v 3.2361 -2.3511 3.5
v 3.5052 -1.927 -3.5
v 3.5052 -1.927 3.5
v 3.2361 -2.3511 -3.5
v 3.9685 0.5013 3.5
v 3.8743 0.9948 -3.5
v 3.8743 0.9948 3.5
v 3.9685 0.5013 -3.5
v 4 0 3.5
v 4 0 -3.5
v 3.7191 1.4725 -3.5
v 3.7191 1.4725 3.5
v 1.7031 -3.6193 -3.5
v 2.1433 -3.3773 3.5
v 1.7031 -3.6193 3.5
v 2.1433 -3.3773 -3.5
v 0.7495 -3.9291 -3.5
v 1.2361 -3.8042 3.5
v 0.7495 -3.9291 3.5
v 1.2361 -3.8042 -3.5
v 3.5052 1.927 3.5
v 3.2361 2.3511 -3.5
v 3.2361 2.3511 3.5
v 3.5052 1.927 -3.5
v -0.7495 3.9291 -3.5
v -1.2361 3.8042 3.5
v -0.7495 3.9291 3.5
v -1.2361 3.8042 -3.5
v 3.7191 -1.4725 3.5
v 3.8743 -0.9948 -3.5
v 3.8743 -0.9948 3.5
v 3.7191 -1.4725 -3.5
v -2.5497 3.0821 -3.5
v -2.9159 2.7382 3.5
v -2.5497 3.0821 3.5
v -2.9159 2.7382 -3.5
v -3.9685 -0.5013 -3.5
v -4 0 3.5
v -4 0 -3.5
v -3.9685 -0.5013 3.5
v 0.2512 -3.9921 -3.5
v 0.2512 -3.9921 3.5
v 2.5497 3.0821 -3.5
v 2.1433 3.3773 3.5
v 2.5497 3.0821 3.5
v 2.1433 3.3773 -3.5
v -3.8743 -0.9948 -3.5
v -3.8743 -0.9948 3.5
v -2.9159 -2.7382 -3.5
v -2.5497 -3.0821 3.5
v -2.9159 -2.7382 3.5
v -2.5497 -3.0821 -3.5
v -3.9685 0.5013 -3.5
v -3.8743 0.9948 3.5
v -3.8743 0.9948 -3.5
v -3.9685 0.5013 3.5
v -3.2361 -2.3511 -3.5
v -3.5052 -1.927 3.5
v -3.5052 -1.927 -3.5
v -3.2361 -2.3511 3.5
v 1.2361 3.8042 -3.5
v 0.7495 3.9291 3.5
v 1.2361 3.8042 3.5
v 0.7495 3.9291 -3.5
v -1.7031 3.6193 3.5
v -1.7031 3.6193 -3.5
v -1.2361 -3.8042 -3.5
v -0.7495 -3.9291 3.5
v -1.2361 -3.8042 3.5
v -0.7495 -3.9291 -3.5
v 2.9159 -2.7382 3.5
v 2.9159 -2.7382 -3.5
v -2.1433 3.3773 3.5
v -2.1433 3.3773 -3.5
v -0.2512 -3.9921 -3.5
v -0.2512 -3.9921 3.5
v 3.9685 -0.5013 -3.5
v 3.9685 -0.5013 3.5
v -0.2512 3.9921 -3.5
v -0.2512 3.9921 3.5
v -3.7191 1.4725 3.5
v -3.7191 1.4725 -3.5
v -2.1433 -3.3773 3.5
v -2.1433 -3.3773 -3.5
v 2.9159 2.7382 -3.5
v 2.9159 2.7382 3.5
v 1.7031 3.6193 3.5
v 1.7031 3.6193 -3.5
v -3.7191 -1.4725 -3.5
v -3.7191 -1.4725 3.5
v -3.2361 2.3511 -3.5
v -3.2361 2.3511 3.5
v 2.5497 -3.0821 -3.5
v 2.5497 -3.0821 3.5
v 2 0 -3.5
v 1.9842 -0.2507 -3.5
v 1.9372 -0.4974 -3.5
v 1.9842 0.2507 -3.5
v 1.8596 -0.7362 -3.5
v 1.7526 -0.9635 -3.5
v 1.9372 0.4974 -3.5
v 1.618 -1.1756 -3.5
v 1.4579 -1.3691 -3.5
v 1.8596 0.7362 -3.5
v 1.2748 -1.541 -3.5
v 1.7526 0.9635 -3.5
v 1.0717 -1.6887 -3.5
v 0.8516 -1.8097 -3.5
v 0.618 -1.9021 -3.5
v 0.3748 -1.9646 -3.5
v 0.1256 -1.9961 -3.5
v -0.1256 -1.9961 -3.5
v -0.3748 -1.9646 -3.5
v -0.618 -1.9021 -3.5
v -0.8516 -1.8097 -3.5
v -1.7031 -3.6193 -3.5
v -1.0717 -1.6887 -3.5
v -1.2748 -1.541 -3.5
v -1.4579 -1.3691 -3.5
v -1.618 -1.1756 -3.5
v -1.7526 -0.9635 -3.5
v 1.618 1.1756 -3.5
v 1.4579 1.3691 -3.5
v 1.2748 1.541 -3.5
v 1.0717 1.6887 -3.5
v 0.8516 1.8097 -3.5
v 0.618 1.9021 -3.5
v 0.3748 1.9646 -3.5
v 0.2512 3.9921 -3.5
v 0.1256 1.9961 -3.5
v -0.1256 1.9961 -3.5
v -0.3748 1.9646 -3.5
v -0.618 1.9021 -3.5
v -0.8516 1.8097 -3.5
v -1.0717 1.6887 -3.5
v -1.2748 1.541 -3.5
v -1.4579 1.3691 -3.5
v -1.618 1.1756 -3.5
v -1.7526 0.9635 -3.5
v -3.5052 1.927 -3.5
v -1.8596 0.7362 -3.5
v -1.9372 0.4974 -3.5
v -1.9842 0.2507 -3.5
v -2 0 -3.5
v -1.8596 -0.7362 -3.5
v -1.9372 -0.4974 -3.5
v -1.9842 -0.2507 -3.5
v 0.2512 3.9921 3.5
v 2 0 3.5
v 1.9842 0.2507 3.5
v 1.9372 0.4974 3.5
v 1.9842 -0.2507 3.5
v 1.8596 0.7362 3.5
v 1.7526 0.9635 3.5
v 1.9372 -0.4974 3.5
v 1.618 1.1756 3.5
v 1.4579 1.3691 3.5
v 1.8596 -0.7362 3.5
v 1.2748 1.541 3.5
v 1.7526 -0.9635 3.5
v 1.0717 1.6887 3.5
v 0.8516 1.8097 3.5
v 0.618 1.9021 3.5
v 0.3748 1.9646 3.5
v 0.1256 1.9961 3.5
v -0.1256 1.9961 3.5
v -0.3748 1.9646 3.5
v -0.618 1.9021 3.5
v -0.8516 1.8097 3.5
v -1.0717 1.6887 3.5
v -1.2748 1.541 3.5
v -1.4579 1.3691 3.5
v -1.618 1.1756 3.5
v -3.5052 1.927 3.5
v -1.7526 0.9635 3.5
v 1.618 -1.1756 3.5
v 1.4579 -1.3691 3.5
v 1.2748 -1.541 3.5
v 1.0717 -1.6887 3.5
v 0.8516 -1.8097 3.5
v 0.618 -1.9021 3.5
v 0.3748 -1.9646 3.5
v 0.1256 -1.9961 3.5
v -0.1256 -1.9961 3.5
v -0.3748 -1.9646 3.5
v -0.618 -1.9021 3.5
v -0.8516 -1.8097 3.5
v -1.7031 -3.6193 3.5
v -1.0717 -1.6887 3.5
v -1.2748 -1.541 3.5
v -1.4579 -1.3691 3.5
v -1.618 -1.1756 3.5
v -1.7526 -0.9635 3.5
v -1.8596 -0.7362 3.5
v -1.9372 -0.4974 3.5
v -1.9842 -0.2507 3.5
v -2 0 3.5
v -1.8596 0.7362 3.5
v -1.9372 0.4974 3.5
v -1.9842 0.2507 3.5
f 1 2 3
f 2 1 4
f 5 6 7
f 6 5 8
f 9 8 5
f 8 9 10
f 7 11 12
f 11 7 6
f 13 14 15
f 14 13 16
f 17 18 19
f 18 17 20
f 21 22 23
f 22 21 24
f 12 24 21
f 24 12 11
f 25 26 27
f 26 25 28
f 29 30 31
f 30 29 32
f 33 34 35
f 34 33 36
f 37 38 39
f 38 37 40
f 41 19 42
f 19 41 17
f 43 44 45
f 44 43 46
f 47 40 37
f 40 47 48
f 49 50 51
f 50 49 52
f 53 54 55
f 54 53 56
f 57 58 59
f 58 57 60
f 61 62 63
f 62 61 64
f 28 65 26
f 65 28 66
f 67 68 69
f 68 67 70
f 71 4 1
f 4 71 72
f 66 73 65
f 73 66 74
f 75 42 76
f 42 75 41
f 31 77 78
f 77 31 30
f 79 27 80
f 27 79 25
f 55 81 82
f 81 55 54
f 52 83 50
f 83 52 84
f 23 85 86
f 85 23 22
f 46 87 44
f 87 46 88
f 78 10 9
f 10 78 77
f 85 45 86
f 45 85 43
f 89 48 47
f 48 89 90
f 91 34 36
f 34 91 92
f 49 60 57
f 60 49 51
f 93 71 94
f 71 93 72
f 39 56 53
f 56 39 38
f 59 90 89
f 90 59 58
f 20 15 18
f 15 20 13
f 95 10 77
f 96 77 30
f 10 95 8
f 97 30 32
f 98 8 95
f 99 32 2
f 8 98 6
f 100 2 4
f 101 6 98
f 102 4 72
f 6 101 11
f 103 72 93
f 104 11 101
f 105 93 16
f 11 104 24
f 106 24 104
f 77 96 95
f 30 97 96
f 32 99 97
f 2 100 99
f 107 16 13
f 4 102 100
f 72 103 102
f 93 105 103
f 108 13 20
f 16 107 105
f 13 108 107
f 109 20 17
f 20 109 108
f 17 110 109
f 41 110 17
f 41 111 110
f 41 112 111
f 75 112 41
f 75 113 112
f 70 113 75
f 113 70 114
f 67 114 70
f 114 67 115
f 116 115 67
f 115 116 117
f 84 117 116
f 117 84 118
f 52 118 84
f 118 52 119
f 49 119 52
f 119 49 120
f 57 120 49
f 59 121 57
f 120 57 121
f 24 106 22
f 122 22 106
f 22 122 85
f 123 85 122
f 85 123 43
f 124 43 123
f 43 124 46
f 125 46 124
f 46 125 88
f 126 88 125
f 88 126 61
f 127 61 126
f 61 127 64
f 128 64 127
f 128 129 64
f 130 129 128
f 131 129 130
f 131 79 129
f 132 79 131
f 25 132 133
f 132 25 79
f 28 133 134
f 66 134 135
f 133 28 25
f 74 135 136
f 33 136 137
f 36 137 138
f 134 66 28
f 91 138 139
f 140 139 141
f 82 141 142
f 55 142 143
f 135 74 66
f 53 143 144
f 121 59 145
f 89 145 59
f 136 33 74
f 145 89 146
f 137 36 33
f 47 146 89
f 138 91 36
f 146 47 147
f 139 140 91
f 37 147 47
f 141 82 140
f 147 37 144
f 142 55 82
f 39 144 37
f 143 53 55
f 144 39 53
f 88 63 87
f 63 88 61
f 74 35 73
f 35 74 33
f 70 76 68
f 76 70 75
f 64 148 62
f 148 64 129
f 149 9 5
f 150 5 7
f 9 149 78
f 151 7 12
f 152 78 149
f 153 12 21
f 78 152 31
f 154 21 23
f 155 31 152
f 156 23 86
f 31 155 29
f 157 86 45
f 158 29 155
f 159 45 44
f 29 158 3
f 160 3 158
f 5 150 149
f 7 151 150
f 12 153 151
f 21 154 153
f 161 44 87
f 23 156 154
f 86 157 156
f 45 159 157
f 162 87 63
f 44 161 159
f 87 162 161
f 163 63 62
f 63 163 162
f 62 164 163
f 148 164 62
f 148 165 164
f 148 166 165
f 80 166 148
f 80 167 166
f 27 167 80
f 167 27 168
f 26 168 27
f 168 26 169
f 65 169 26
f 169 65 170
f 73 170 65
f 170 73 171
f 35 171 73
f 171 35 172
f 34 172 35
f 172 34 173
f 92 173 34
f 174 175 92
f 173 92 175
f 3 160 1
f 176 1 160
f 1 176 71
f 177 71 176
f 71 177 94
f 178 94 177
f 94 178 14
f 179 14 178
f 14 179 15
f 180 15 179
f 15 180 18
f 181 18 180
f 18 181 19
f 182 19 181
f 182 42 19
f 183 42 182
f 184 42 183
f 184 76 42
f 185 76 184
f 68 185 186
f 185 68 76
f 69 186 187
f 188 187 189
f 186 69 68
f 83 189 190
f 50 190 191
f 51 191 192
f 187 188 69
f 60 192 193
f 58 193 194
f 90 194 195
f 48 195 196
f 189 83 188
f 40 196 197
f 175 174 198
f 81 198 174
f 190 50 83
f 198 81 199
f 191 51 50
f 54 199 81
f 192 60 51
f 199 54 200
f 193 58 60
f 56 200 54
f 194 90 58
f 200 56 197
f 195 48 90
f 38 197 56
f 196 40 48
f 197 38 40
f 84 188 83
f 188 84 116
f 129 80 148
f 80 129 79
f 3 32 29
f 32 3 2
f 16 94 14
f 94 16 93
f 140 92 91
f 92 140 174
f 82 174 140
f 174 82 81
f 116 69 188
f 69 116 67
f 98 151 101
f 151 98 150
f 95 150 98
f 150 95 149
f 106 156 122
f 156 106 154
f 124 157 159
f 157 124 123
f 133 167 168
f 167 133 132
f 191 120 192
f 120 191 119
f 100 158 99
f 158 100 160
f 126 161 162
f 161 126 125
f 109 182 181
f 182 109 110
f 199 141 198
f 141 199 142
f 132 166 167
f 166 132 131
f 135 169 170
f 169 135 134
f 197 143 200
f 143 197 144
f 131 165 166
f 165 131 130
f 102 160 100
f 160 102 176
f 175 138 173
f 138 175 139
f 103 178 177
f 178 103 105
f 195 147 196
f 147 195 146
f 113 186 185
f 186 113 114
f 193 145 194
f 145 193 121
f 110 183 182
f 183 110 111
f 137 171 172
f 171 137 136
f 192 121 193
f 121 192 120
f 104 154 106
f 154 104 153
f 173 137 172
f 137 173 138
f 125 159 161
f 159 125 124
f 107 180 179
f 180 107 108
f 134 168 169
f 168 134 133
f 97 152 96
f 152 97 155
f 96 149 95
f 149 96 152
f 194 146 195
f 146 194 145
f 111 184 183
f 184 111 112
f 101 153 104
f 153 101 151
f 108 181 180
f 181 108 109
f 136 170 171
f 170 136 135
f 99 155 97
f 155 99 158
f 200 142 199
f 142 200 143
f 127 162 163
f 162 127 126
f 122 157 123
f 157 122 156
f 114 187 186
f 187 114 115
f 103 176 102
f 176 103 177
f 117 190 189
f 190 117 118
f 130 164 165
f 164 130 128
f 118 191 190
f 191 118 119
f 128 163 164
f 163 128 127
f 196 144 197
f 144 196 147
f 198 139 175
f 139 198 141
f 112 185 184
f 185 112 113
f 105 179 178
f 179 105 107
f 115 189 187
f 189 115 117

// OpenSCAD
$fn = 50;


difference() {
	union() {
		translate(v = [0, 0, -3.5000000000]) {
			cylinder(h = 7, r = 4.0000000000);
		}
	}
	union() {
		translate(v = [0, 0, -100.0000000000]) {
			cylinder(h = 200, r = 2.0000000000);
		}
	}
}
